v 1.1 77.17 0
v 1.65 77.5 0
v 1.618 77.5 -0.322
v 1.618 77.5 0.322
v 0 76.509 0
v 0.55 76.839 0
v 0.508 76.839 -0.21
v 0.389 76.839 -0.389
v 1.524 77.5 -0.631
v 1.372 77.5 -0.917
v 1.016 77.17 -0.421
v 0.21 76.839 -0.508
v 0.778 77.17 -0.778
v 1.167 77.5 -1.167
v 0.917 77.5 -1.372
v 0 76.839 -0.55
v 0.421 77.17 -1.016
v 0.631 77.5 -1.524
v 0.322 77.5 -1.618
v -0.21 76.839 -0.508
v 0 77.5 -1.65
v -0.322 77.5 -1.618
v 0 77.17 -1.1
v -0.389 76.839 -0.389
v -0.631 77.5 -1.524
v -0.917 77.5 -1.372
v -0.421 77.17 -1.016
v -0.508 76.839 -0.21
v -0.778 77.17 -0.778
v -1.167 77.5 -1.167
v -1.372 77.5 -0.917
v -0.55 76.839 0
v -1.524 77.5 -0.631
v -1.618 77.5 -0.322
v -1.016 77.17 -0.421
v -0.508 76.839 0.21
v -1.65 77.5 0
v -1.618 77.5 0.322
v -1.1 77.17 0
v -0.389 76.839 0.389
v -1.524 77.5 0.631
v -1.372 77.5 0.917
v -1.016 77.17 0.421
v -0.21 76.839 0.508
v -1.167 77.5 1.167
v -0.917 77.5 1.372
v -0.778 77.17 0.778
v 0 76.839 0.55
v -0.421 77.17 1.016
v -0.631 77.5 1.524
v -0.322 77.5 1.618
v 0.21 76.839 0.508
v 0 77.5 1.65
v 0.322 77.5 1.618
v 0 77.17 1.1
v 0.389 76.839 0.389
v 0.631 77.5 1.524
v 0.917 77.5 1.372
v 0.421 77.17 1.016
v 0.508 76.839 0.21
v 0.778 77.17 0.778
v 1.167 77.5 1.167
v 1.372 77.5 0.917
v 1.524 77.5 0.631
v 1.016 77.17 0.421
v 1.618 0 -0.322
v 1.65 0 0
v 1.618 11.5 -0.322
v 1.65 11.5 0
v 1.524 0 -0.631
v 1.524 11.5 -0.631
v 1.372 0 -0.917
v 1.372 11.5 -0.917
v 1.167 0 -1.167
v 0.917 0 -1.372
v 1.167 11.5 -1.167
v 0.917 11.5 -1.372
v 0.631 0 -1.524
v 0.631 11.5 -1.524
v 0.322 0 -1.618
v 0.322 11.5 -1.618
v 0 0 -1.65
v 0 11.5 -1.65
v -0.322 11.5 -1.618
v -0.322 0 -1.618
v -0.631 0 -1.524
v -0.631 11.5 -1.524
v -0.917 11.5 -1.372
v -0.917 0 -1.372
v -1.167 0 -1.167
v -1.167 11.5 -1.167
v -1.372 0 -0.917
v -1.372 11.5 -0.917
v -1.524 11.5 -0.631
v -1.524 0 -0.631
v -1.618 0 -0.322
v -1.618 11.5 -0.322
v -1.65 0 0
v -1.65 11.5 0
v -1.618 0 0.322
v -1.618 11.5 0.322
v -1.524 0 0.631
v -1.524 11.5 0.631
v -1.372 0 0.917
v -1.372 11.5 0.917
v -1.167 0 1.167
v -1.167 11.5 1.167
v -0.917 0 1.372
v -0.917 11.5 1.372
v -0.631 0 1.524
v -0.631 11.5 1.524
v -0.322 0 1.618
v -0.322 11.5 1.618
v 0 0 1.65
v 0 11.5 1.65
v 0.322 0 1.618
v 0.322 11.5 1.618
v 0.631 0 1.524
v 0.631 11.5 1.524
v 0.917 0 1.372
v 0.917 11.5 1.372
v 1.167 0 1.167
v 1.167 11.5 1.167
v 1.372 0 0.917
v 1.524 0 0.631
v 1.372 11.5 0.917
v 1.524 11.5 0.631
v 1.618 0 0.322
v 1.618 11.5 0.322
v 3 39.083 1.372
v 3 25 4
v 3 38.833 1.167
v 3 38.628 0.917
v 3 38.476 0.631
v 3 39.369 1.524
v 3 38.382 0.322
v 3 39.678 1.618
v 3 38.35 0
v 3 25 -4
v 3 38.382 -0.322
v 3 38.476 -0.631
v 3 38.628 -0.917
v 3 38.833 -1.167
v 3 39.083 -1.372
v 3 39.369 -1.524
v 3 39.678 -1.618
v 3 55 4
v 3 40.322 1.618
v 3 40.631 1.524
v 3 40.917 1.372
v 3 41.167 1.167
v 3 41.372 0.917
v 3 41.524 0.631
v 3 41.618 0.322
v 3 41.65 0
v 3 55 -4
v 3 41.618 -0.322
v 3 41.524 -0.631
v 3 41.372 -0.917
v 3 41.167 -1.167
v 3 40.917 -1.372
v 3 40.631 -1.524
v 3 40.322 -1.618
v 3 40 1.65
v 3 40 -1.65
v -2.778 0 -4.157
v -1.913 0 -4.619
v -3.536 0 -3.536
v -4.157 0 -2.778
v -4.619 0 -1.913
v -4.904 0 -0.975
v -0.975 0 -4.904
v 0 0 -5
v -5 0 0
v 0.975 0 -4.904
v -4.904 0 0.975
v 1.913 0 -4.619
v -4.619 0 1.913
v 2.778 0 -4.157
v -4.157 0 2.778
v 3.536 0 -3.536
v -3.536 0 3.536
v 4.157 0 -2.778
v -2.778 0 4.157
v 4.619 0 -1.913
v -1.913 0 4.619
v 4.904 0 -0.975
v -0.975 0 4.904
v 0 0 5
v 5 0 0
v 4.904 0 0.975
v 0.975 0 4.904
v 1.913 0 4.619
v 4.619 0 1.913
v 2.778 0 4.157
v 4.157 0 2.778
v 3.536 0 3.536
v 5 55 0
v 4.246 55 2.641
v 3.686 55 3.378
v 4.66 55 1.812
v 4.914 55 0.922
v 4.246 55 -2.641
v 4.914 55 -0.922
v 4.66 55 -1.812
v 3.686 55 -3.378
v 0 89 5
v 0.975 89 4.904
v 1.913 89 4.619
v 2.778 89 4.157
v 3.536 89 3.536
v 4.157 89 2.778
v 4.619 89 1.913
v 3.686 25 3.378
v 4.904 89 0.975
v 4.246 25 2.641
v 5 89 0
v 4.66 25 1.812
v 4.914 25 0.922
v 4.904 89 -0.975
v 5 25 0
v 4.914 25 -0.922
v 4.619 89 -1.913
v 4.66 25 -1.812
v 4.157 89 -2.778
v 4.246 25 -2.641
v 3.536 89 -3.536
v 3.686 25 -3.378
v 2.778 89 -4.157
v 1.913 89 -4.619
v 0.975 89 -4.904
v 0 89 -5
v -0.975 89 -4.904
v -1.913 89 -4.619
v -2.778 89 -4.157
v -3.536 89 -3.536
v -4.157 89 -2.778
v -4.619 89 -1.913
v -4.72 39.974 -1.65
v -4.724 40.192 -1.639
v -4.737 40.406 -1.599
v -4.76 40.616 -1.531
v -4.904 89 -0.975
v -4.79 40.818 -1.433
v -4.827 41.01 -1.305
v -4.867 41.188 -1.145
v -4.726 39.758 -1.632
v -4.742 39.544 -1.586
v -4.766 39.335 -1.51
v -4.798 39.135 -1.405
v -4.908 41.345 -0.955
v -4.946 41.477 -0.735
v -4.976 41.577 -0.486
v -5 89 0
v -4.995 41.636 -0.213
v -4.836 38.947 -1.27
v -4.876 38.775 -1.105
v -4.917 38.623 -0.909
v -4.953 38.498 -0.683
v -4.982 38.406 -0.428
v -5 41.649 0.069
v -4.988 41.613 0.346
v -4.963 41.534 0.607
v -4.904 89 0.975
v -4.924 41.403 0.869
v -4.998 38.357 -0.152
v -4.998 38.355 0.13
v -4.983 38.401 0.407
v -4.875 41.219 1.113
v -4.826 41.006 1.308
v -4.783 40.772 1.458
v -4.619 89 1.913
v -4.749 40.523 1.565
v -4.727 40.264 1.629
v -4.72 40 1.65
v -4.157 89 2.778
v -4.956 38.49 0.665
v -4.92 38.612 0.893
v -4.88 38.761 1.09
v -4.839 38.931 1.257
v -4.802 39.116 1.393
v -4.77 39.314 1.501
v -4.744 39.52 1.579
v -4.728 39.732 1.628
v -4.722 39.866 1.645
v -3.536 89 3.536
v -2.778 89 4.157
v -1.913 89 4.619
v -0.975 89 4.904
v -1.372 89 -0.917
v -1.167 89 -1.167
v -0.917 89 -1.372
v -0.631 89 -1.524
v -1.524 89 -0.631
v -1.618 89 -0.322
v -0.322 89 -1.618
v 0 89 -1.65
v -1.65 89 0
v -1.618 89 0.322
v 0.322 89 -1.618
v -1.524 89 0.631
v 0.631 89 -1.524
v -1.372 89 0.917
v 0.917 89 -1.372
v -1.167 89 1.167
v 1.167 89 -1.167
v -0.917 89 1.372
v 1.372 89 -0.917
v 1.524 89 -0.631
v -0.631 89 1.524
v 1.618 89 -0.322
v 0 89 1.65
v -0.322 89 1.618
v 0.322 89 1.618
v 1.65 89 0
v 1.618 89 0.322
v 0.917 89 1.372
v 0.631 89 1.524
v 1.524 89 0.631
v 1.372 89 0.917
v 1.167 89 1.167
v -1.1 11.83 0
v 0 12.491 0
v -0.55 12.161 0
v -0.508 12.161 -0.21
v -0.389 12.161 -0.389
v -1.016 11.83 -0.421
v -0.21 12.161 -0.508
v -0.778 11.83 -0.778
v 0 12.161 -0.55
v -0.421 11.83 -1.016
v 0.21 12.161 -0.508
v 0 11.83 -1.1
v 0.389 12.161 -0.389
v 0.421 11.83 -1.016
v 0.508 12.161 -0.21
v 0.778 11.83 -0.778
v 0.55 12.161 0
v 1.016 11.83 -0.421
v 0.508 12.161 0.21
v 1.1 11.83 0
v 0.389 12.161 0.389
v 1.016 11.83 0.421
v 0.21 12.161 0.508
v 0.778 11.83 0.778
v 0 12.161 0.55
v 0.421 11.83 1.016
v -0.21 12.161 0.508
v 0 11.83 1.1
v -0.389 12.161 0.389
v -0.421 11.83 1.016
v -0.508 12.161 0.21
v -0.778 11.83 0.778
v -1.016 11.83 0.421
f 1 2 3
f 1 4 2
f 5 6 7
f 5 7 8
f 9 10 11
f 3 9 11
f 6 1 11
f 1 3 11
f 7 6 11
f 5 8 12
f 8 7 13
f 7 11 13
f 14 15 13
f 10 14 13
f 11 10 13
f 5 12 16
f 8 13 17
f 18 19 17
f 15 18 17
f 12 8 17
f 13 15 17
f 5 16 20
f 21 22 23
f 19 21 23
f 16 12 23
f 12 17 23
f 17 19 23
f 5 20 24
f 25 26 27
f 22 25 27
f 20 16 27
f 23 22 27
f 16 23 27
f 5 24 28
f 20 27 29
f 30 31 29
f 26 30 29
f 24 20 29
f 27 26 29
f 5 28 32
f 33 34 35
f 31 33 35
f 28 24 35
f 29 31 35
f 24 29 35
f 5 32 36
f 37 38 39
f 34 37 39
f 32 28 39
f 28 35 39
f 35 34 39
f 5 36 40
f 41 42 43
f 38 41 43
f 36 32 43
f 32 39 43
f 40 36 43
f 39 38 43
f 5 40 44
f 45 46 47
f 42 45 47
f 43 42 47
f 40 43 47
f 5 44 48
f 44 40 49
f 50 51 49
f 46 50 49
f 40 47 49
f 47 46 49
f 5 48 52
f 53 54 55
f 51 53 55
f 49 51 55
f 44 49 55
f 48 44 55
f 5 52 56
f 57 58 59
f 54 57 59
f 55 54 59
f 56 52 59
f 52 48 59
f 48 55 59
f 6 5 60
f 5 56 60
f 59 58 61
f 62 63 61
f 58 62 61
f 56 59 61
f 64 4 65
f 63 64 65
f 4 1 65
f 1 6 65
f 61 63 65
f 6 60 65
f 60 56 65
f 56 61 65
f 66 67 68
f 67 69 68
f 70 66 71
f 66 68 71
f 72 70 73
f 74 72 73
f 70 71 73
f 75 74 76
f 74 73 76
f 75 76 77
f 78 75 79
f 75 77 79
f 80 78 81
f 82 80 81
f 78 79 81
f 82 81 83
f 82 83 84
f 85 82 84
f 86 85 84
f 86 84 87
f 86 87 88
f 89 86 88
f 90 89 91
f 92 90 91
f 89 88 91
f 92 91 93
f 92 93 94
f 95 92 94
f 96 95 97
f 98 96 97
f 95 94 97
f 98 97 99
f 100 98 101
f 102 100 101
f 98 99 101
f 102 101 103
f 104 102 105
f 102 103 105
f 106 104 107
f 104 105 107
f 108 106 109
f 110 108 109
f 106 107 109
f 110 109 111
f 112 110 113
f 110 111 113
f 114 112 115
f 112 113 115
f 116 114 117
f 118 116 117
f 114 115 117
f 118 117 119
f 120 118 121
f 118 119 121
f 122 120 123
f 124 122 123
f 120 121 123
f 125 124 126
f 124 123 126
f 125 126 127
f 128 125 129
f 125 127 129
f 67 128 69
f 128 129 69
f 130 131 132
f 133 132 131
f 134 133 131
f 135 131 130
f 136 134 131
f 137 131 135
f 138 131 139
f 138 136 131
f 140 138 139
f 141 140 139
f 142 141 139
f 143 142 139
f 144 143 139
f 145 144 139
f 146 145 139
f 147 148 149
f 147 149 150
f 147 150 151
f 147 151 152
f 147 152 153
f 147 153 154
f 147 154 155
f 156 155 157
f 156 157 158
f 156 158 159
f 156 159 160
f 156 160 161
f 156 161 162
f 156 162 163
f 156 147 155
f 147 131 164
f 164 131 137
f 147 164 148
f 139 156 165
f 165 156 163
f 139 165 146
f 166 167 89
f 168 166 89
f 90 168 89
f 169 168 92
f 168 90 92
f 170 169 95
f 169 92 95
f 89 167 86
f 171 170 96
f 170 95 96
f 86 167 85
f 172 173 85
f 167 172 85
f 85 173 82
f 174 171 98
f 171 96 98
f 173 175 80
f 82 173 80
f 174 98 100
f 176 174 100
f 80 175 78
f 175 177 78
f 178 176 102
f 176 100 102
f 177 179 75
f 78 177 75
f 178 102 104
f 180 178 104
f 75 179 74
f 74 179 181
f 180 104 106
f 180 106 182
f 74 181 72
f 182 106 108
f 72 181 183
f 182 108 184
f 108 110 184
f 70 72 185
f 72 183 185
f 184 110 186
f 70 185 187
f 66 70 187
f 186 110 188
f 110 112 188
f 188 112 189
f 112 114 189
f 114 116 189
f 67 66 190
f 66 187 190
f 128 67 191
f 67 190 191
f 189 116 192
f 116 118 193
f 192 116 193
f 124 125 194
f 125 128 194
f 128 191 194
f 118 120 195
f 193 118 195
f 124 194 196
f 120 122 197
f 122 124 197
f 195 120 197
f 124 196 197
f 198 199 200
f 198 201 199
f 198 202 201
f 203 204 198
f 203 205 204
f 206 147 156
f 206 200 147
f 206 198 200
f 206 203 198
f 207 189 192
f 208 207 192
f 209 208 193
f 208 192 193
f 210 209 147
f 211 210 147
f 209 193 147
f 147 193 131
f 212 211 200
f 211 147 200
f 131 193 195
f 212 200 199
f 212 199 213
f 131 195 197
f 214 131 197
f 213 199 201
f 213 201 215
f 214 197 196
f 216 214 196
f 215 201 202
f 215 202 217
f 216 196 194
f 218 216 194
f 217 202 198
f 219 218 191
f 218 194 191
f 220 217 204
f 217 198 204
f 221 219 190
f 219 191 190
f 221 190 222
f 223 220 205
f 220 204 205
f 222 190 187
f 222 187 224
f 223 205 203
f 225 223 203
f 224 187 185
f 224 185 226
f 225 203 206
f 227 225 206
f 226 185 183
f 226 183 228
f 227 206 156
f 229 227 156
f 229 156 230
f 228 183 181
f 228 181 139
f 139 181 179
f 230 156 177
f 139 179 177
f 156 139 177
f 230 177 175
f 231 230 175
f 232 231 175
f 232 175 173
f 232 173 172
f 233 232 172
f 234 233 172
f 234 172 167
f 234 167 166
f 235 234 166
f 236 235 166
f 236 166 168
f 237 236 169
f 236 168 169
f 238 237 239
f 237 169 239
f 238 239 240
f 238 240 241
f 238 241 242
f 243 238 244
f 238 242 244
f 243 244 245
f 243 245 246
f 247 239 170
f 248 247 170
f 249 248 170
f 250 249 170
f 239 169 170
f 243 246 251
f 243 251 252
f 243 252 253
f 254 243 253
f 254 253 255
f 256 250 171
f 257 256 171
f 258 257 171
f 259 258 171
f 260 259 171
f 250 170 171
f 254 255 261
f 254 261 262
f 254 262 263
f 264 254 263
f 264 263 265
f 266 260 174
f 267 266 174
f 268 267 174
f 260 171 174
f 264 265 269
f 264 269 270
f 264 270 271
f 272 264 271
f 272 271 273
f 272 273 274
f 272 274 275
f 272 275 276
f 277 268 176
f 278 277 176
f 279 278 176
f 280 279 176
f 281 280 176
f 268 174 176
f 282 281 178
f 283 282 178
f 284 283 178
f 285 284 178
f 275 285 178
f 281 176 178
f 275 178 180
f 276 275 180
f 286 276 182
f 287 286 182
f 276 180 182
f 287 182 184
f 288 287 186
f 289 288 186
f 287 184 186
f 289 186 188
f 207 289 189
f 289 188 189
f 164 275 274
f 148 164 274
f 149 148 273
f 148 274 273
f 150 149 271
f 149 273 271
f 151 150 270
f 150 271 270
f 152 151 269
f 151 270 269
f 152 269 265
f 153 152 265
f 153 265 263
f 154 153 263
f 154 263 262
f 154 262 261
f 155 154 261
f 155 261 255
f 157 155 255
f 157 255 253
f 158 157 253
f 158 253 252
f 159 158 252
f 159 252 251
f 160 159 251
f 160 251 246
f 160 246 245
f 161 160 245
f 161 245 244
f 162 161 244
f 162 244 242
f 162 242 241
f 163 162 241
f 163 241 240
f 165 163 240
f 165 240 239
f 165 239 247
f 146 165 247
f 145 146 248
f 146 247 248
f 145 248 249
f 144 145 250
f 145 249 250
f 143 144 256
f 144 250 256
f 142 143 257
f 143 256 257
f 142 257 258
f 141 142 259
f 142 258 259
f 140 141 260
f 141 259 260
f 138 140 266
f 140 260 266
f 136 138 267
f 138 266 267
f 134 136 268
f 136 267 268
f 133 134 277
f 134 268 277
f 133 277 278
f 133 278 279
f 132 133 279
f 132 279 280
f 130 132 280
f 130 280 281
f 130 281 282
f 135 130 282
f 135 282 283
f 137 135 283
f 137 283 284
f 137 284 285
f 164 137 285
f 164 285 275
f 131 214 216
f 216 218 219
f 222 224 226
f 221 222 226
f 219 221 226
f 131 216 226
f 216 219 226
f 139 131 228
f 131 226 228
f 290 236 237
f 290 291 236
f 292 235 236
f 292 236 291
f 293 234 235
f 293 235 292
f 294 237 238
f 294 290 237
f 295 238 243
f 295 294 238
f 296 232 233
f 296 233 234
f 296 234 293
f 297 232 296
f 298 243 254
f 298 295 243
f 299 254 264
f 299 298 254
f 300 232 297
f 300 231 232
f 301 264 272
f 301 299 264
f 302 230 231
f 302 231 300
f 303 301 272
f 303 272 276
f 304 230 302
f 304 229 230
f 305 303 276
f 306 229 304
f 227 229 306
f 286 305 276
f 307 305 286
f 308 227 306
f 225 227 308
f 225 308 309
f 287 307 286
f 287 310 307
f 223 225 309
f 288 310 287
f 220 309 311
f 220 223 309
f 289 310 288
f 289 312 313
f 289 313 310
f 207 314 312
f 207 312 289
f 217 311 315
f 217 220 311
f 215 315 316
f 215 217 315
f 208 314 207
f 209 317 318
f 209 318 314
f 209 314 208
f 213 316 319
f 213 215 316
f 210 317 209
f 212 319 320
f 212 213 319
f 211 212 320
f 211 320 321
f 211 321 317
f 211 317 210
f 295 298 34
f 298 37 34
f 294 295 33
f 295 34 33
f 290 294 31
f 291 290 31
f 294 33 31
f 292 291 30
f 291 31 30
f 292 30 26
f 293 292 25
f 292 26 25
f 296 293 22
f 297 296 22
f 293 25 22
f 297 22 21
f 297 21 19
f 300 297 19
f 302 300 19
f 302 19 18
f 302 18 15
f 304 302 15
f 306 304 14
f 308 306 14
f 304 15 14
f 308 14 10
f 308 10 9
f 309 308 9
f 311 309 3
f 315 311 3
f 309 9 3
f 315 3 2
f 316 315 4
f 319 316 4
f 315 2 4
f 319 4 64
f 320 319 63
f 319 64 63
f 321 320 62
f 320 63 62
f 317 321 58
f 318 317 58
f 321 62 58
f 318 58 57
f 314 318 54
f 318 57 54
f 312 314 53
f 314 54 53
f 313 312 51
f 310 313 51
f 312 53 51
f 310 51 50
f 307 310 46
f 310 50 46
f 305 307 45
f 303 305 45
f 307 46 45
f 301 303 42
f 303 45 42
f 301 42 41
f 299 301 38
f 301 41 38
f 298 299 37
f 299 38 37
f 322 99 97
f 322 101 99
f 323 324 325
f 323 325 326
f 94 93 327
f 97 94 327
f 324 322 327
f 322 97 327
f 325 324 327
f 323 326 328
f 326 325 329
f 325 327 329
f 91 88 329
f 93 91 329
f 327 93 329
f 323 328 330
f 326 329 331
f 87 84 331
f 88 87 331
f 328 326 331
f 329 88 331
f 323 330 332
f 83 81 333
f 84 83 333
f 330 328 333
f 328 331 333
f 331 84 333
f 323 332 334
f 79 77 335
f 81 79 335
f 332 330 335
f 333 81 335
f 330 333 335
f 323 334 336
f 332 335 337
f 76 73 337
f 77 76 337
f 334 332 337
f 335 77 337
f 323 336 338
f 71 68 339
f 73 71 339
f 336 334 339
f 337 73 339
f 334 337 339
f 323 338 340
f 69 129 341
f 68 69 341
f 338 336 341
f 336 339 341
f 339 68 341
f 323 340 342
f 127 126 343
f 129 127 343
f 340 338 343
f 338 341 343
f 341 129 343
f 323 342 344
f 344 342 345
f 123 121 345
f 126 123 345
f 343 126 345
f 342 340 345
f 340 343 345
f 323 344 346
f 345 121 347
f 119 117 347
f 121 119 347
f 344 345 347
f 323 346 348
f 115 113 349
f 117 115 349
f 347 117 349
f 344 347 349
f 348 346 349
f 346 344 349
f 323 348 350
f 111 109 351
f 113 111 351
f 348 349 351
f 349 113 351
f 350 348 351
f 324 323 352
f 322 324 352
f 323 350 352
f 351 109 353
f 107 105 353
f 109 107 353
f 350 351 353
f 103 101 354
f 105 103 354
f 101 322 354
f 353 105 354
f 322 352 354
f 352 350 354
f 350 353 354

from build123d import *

# Parameters (mm, degrees)
SKETCH_1_R             = 5
EXTRUDE_1_DEPTH        = 89
HOLE_WIZARD_M4_2_D     = 3.3
HOLE_WIZARD_M4_2_DEPTH = 11.5
HOLE_WIZARD_M4_2_TIP   = 0.991420021
HOLE_WIZARD_M4_1_D     = 3.3
HOLE_WIZARD_M4_1_DEPTH = 11.5
HOLE_WIZARD_M4_1_TIP   = 0.991420021
CUT_EXTRUDE_START      = 5
SKETCH_7_W             = 26.609090492
SKETCH_7_H             = 30
CUT_EXTRUDE_1_DEPTH    = 2
HOLE_WIZARD_M4_3_D     = 3.3
HOLE_WIZARD_M4_3_DEPTH = 11.5
HOLE_WIZARD_M4_3_TIP   = 0.991420021


with BuildPart() as part:
    # 草图1 → 凸台-拉伸1 (new body)
    with BuildSketch(Plane(origin=(0, 0, 0), x_dir=(1, 0, 0), z_dir=(0, 1, 0))):
        with Locations(Location((0, 0, 0), (0, 0, 270))):
            Circle(SKETCH_1_R)
    extrude(amount=EXTRUDE_1_DEPTH)

    # M4 螺纹孔2
    with Locations(Plane(origin=(0, 89, 0), x_dir=(1, 0, 0), z_dir=(0, 1, 0))):
        with Locations((0, 0)):
            Hole(HOLE_WIZARD_M4_2_D / 2, depth=HOLE_WIZARD_M4_2_DEPTH)
            with Locations((0, 0, -(HOLE_WIZARD_M4_2_DEPTH + HOLE_WIZARD_M4_2_TIP / 2))):  # 118° drill point
                Cone(0, HOLE_WIZARD_M4_2_D / 2, HOLE_WIZARD_M4_2_TIP, mode=Mode.SUBTRACT)

    # M4 螺纹孔1
    with Locations(Plane(origin=(0, 0, 0), x_dir=(-1, 0, 0), z_dir=(0, -1, 0))):
        with Locations((0, 0)):
            Hole(HOLE_WIZARD_M4_1_D / 2, depth=HOLE_WIZARD_M4_1_DEPTH)
            with Locations((0, 0, -(HOLE_WIZARD_M4_1_DEPTH + HOLE_WIZARD_M4_1_TIP / 2))):  # 118° drill point
                Cone(0, HOLE_WIZARD_M4_1_D / 2, HOLE_WIZARD_M4_1_TIP, mode=Mode.SUBTRACT)

    # 草图7 → 切除-拉伸1 (cut)
    with BuildSketch(Plane(origin=(0, 0, 0), x_dir=(0, 0, -1), z_dir=(1, 0, 0)).offset(CUT_EXTRUDE_START)):
        with Locations((0, 40)):
            Rectangle(SKETCH_7_W, SKETCH_7_H)
    extrude(amount=-CUT_EXTRUDE_1_DEPTH, mode=Mode.SUBTRACT)

    # M4 螺纹孔3
    with Locations(Plane(origin=(3, 0, 0), x_dir=(0, 0, -1), z_dir=(1, 0, 0))):
        with Locations((0, 40)):
            Hole(HOLE_WIZARD_M4_3_D / 2, depth=HOLE_WIZARD_M4_3_DEPTH)
            with Locations((0, 0, -(HOLE_WIZARD_M4_3_DEPTH + HOLE_WIZARD_M4_3_TIP / 2))):  # 118° drill point
                Cone(0, HOLE_WIZARD_M4_3_D / 2, HOLE_WIZARD_M4_3_TIP, mode=Mode.SUBTRACT)


solid = part.part
